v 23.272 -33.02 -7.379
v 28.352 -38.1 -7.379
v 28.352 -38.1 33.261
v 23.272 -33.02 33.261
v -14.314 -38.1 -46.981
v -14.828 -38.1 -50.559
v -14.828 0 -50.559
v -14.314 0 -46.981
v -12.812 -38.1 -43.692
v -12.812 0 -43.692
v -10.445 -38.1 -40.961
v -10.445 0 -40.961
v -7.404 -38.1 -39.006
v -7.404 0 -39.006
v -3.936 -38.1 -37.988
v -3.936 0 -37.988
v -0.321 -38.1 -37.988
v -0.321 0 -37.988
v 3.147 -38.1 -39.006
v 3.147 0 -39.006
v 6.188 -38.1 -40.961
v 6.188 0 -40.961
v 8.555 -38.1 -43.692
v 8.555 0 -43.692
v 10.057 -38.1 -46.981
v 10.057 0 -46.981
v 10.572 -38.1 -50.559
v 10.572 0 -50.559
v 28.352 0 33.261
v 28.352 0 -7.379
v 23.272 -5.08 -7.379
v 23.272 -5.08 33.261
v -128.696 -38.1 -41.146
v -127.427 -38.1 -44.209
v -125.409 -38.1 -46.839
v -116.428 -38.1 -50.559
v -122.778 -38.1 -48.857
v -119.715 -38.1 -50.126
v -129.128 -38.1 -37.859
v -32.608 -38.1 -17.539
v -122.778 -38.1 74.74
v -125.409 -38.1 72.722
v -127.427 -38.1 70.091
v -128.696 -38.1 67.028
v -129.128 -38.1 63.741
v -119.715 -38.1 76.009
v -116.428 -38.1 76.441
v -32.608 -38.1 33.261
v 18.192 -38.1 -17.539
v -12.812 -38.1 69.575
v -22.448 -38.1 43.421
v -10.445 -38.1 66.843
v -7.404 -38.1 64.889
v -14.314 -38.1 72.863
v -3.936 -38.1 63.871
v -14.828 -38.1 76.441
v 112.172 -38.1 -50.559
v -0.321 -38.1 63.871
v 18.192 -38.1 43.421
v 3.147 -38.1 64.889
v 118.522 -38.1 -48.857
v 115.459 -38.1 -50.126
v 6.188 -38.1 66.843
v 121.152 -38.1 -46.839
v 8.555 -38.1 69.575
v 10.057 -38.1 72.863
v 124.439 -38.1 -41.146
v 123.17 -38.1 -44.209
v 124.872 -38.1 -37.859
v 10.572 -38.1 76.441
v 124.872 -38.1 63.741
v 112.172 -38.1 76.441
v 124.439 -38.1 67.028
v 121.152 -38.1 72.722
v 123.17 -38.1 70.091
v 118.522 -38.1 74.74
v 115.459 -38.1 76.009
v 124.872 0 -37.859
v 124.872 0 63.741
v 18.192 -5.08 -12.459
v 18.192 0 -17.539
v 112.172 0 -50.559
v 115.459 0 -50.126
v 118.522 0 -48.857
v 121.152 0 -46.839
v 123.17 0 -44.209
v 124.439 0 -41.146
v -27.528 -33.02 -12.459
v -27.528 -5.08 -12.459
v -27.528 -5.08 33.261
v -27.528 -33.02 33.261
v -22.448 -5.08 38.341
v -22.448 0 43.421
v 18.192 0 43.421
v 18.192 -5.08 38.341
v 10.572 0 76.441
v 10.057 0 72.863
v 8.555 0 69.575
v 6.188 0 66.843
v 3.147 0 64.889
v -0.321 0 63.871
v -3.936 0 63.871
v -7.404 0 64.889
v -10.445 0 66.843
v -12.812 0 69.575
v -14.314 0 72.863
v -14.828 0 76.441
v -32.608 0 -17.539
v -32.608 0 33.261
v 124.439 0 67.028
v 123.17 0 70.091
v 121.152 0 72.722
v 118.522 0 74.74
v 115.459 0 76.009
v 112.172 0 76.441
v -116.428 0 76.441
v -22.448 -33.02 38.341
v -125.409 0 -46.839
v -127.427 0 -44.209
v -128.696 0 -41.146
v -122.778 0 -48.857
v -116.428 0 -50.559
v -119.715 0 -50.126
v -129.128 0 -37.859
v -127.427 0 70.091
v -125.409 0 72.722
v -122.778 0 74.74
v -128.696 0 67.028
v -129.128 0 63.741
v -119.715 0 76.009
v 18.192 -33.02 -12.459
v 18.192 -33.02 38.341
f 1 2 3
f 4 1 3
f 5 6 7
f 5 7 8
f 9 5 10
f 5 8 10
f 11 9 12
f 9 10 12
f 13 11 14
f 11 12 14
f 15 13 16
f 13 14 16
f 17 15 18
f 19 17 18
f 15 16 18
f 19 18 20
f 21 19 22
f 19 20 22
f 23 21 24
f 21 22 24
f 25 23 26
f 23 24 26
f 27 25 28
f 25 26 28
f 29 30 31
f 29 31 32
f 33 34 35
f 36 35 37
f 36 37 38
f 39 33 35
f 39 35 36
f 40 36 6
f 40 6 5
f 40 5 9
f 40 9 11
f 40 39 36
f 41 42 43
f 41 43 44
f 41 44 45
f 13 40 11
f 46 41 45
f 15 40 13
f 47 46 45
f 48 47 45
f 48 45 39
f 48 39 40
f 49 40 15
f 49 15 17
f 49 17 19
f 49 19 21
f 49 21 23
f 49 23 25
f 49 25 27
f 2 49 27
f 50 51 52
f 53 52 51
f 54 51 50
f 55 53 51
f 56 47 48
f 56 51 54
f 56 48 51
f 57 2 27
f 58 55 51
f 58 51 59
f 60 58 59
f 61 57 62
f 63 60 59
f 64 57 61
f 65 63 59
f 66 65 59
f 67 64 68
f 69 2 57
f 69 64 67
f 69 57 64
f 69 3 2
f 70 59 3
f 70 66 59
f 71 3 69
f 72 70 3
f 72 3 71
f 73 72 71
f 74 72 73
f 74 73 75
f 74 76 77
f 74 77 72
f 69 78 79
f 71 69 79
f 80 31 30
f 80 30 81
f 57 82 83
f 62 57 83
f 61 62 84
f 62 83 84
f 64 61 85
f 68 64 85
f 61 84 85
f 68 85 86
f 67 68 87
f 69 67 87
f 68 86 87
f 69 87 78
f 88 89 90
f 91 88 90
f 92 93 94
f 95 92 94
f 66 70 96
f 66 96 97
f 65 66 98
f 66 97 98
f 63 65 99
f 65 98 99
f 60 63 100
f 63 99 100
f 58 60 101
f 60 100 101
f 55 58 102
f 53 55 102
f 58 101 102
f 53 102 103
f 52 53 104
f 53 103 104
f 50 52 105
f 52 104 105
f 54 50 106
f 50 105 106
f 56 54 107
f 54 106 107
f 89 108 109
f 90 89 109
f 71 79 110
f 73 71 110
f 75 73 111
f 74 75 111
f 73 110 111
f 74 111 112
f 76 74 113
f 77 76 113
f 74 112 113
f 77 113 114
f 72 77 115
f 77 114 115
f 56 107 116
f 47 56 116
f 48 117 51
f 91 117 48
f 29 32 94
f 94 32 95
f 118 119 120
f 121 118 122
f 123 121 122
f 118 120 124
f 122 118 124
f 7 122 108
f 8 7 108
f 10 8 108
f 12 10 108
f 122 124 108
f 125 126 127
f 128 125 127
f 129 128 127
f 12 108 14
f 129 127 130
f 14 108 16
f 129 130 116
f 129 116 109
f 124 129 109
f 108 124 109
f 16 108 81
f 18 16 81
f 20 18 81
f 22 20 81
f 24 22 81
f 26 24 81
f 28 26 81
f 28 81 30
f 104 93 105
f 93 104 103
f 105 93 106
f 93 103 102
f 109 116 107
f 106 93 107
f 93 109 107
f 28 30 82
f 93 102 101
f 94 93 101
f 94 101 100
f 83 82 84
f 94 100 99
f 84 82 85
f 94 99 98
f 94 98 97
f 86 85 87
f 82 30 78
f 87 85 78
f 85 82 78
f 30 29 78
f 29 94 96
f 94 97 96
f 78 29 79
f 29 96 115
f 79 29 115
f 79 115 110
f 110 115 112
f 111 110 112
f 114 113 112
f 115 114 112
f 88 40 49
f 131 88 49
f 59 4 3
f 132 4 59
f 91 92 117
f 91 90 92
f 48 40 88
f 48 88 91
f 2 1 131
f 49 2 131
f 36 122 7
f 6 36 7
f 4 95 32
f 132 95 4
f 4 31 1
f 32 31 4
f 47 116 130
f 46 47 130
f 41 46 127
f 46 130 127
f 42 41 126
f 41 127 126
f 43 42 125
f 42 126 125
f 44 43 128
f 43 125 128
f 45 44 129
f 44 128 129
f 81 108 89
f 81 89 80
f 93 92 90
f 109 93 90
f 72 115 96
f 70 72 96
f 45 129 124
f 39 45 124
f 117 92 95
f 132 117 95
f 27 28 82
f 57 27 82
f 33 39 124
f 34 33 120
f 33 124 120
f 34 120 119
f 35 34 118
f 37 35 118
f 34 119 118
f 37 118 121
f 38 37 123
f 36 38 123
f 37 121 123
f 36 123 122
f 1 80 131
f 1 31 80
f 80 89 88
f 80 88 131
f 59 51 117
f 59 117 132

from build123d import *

# Parameters (mm, degrees)
F0_W     = 50.8
F0_H     = 50.8
F1_DEPTH = 38.1
F2_SIZE  = 5.08


with BuildPart() as f1:
    # F0 (on Front) → F1 (new body)
    with BuildSketch(Plane.XZ):
        with BuildLine():
            Line((-14.8284427494, 76.4413994114), (-116.4284427494, 76.4413994114))
            ThreePointArc((-116.4284427494, 76.4413994114), (-125.4086988705, 72.7216555324), (-129.1284427494, 63.7413994114))
            Line((-129.1284427494, 63.7413994114), (-129.1284427494, -37.8586005886))
            ThreePointArc((-129.1284427494, -37.8586005886), (-125.4086988705, -46.8388567097), (-116.4284427494, -50.5586005886))
            Line((-116.4284427494, -50.5586005886), (-14.8284427494, -50.5586005886))
            ThreePointArc((-14.8284427494, -50.5586005886), (-2.1284427494, -37.8586005886), (10.5715572506, -50.5586005886))
            Line((10.5715572506, -50.5586005886), (112.1715572506, -50.5586005886))
            ThreePointArc((112.1715572506, -50.5586005886), (121.1518133717, -46.8388567097), (124.8715572506, -37.8586005886))
            Line((124.8715572506, -37.8586005886), (124.8715572506, 63.7413994114))
            ThreePointArc((124.8715572506, 63.7413994114), (121.1518133717, 72.7216555324), (112.1715572506, 76.4413994114))
            Line((112.1715572506, 76.4413994114), (10.5715572506, 76.4413994114))
            ThreePointArc((10.5715572506, 76.4413994114), (-2.1284427494, 63.7413994114), (-14.8284427494, 76.4413994114))
        make_face()
        with Locations((-2.1284427494, 12.9413994114)):
            Rectangle(F0_W, F0_H, mode=Mode.SUBTRACT)
    extrude(amount=F1_DEPTH)

    # F2
    f2_edges = [f1.edges().sort_by_distance(p)[0] for p in [
        (23.271557, -19.05, 38.341399),
        (23.271557, -19.05, -12.458601),
        (23.271557, 0, 12.941399),
        (23.271557, -38.1, 12.941399),
        (-27.528443, -19.05, 38.341399),
        (-2.128443, 0, 38.341399),
        (-2.128443, -38.1, 38.341399),
        (-27.528443, 0, 12.941399),
        (-27.528443, -38.1, 12.941399),
        (-2.128443, 0, -12.458601),
        (-2.128443, -38.1, -12.458601),
    ]]
    chamfer(f2_edges, length=F2_SIZE)


solid = f1.part
